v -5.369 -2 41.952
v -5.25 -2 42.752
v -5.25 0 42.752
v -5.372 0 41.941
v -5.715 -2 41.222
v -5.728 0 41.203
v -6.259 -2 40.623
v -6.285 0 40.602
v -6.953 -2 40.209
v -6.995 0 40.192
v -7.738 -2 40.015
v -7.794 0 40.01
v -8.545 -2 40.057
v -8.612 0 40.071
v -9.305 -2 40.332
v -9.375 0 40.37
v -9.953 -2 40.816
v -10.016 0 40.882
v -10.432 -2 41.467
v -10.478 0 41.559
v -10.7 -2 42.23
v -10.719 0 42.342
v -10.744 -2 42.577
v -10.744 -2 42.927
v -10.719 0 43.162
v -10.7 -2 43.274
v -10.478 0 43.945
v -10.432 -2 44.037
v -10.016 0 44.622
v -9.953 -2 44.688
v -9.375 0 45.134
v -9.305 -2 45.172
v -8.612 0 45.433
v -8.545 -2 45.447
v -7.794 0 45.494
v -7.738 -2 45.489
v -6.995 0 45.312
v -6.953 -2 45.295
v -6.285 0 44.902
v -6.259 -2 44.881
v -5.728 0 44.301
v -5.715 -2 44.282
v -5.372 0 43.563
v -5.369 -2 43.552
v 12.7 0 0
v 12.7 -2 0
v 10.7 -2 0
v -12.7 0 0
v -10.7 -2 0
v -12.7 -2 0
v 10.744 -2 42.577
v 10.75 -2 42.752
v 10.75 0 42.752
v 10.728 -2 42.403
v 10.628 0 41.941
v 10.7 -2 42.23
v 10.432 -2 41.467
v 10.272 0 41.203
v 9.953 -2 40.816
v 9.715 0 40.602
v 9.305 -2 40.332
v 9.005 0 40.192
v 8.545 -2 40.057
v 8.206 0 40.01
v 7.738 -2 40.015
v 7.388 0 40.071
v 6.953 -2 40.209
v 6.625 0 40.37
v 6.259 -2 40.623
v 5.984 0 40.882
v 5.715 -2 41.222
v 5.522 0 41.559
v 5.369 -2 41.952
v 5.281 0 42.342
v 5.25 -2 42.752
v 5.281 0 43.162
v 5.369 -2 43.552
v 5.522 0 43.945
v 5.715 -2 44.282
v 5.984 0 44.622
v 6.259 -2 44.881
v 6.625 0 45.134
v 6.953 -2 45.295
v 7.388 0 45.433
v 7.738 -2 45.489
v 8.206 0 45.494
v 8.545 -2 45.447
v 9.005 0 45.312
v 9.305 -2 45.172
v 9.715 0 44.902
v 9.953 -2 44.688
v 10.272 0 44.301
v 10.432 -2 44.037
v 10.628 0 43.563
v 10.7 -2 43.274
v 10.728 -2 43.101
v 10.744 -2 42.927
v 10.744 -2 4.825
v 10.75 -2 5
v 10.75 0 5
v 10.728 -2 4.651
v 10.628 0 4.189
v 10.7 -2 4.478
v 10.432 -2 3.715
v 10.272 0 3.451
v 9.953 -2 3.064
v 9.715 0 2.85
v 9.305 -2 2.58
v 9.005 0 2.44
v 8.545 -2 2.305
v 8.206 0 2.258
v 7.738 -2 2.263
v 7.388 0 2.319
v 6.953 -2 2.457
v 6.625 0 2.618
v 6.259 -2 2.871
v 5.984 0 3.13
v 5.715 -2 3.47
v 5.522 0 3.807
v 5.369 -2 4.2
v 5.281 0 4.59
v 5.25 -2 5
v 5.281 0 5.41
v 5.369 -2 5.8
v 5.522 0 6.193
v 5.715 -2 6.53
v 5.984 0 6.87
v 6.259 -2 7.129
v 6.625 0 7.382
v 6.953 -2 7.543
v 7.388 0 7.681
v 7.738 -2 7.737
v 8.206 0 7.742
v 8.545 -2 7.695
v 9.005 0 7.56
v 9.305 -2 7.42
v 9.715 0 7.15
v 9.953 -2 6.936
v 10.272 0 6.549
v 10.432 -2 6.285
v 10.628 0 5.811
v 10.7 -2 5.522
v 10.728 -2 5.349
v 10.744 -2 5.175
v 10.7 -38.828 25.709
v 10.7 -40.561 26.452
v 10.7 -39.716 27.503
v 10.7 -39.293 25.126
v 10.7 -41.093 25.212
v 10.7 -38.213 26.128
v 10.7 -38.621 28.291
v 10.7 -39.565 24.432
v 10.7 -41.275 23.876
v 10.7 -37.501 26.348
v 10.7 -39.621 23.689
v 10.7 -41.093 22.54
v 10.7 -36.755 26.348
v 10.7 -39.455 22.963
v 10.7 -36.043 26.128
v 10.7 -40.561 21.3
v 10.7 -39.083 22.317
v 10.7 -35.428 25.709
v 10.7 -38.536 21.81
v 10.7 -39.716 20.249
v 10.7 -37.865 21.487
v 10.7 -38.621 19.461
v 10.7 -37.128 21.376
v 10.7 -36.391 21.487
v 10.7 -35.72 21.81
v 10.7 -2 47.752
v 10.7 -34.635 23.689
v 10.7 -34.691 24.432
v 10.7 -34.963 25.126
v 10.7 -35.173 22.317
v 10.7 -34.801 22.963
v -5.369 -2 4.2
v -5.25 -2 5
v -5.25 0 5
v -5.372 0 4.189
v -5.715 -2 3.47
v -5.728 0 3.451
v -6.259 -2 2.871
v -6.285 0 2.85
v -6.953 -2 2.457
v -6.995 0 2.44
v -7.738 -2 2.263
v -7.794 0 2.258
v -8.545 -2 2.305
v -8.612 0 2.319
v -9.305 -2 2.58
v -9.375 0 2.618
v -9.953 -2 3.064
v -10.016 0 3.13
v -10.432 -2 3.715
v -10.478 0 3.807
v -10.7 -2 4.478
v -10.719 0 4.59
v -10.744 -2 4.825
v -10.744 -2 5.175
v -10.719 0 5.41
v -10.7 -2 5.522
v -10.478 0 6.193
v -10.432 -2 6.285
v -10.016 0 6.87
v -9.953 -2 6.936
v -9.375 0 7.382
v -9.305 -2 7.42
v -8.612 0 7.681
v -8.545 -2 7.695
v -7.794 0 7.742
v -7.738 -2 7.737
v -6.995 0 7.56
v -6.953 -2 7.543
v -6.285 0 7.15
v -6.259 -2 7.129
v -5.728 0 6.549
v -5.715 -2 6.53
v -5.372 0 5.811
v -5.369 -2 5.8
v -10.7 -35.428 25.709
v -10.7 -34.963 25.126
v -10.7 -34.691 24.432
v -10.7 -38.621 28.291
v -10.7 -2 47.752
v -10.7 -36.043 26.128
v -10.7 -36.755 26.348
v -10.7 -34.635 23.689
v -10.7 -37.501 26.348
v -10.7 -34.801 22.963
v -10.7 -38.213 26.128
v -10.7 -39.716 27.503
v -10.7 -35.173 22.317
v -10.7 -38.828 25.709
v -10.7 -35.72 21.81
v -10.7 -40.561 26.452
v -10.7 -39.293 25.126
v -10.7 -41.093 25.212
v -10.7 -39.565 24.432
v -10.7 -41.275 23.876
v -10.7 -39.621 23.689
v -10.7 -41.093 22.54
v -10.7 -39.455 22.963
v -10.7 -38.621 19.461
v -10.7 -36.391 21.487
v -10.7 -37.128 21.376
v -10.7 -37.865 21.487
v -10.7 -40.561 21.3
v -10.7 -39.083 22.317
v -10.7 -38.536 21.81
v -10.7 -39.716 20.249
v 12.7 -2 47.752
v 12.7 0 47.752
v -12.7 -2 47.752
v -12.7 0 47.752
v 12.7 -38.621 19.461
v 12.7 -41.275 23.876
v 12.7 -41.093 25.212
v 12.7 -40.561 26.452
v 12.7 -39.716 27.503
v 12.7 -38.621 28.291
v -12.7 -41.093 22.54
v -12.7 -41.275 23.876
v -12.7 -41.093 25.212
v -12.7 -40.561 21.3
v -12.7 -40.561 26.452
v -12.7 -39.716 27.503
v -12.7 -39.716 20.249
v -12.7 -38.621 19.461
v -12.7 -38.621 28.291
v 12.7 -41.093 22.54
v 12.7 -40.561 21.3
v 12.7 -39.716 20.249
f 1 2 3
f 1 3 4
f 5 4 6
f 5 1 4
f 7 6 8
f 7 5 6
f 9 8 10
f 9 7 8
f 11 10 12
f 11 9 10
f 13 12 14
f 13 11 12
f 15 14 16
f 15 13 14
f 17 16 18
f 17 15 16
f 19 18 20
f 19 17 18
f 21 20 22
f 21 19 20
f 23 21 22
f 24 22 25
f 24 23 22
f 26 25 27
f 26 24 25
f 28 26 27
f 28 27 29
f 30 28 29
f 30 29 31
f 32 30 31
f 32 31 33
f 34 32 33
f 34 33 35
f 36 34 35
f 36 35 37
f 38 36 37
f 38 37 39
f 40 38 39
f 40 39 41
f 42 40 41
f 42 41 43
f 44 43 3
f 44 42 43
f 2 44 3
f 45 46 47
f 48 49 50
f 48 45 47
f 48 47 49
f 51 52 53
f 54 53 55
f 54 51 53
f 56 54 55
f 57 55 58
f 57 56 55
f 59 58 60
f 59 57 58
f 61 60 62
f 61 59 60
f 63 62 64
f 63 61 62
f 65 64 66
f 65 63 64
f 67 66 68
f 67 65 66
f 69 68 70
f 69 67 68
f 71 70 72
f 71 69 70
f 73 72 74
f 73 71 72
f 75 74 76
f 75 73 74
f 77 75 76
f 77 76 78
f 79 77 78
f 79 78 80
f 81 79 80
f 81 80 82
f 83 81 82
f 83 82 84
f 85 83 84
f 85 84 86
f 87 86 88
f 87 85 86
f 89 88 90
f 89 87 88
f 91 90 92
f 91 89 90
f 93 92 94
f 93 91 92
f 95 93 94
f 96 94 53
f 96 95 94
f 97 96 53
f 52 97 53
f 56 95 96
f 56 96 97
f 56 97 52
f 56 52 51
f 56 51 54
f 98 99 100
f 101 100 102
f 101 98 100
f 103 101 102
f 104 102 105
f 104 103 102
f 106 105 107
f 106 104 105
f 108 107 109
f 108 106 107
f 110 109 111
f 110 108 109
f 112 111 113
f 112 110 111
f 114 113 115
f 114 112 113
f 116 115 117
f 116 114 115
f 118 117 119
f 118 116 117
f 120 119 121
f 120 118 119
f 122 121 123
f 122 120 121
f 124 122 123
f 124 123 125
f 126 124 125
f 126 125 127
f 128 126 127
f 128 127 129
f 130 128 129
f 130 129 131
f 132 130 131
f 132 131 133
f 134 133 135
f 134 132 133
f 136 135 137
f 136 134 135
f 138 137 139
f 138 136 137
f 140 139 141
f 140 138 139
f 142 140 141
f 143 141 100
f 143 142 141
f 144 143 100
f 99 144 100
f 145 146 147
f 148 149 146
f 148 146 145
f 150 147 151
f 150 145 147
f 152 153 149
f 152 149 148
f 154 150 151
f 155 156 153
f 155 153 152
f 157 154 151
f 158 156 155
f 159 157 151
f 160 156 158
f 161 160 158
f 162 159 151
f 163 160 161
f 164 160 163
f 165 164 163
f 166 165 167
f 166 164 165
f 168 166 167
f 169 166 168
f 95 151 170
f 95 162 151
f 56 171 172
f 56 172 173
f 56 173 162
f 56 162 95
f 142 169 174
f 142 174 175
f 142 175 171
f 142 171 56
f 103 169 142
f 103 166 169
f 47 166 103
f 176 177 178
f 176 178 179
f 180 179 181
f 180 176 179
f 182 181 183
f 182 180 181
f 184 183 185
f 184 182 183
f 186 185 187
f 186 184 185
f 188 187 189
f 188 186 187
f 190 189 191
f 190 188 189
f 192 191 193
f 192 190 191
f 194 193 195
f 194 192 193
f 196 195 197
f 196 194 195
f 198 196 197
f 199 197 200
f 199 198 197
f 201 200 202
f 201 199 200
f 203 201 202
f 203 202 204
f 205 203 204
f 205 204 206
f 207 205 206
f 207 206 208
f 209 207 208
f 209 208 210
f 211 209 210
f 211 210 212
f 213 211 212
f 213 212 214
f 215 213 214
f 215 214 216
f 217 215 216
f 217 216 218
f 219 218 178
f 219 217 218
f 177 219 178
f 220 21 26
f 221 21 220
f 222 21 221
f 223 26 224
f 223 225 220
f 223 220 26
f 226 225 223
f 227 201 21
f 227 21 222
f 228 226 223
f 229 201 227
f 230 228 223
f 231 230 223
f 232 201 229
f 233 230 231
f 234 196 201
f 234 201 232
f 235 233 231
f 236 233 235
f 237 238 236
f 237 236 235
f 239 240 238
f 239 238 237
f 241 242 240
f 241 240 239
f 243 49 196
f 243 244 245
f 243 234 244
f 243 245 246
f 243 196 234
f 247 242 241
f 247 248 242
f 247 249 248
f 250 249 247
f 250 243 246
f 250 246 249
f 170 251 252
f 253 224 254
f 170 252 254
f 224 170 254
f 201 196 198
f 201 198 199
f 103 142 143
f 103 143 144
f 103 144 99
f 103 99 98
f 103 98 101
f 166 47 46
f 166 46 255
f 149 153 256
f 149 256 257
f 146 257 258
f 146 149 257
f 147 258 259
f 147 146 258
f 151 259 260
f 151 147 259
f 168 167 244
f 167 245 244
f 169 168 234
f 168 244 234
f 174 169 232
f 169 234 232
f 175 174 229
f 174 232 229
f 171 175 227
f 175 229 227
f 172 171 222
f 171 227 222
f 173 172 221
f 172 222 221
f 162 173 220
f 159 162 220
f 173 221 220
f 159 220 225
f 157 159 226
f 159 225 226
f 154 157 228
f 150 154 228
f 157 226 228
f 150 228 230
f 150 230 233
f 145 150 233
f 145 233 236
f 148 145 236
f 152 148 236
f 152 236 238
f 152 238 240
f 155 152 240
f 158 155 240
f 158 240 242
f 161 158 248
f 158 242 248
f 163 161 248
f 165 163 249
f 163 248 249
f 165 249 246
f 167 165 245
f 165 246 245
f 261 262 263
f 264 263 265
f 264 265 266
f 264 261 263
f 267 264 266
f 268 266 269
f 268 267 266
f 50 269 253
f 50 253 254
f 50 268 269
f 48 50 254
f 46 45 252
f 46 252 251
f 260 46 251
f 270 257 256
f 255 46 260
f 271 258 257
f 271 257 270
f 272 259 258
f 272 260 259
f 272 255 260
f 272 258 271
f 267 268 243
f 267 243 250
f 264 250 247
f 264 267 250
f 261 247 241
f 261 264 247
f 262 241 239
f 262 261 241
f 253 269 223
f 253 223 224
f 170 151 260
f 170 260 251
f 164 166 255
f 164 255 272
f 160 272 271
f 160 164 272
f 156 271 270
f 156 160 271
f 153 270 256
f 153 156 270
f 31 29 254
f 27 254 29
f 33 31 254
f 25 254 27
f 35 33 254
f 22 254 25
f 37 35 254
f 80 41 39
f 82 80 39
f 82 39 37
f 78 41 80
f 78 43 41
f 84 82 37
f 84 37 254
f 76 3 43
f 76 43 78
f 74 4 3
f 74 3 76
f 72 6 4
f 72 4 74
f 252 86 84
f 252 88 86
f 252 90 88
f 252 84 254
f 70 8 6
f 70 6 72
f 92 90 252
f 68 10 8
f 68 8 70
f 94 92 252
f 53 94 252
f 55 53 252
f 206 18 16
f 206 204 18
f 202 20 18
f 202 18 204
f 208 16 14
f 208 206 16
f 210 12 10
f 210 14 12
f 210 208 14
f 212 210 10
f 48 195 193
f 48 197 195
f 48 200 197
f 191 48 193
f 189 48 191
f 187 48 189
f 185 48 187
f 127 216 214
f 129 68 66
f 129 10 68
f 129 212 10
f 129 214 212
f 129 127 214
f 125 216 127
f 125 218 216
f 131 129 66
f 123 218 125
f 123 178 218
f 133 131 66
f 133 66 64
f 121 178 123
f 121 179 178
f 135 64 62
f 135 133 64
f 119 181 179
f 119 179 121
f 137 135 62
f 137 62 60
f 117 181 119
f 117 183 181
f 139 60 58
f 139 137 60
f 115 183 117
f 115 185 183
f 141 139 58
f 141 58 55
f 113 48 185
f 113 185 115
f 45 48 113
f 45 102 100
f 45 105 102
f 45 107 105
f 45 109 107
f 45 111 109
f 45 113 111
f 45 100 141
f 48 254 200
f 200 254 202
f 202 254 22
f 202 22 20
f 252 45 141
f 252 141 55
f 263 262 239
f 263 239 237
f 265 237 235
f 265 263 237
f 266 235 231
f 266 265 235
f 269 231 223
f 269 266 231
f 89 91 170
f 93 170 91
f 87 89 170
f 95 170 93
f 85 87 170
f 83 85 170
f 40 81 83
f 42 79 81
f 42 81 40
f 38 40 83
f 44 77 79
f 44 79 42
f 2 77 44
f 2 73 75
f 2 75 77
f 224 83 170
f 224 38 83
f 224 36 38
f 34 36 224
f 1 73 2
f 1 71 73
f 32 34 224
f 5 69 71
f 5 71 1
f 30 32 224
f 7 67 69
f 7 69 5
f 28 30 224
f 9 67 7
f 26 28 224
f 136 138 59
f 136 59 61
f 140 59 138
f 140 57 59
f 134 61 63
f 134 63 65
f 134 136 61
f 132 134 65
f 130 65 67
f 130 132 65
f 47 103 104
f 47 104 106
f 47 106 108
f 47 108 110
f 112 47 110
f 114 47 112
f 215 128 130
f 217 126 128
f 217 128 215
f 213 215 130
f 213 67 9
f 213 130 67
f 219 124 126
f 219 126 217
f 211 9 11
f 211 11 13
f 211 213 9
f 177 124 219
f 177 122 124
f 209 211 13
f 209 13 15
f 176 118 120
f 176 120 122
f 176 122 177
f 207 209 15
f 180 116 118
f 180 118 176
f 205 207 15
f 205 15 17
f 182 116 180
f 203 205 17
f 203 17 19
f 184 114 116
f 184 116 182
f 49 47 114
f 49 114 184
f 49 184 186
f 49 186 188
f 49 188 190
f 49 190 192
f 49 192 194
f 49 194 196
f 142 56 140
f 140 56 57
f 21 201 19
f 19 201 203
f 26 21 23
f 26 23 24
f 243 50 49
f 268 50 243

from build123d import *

# Parameters (mm, degrees)
BOSS_EXTRUDE1_DEPTH          = 47.752
CUT_EXTRUDE1_DEPTH           = 47.752
CUT_EXTRUDE1_DEPTH_BACK      = 47.752
BOSS_EXTRUDE6_START          = -10.7
SKETCH3_R                    = 2.5
BOSS_EXTRUDE6_DEPTH          = 10.7
SKETCH3_2_R                  = 2.5
BOSS_EXTRUDE7_DEPTH          = 10.7
M5_START                     = -2
M5_CLEARANCE_HOLE1_OUTLINE_R = 2.75
M5_CLEARANCE_HOLE1_DEPTH     = 2


# Read off the part's stored shape, not the designer's step: M5 Clearance Hole1
with BuildPart() as part:
    # Sketch1 → Boss-Extrude1 (new body)
    with BuildSketch(Plane.XY):
        Polygon((-12.7, -41.275), (-12.7, 0), (12.7, 0), (12.7, -41.275), (10.7, -41.275), (10.7, -2), (-10.7, -2), (-10.7, -41.275), align=None)
    extrude(amount=BOSS_EXTRUDE1_DEPTH)

    # Sketch2 → Cut-Extrude1 (cut, two sides: drawn at the far end of the back side and taken through both)
    with BuildSketch(Plane(origin=(0, 0, 0), x_dir=(0, 0, -1), z_dir=(1, 0, 0)).offset(-CUT_EXTRUDE1_DEPTH_BACK)):
        with BuildLine():
            Line((-23.876, -42.10871549), (-23.876, -41.275))
            ThreePointArc((-23.876, -41.275), (-26.451700932, -40.560529688), (-28.291297125, -38.621305883))
            Line((-28.291297125, -38.621305883), (-47.752, -2))
            Line((-47.752, -2), (-47.752, -42.10871549))
            Line((-47.752, -42.10871549), (-23.876, -42.10871549))
        make_face()
        with BuildLine():
            Line((0, -42.10871549), (0, -2))
            Line((0, -2), (-19.460702875, -38.621305883))
            ThreePointArc((-19.460702875, -38.621305883), (-21.300299068, -40.560529688), (-23.876, -41.275))
            Line((-23.876, -41.275), (-23.876, -42.10871549))
            Line((-23.876, -42.10871549), (0, -42.10871549))
        make_face()
    extrude(amount=CUT_EXTRUDE1_DEPTH + CUT_EXTRUDE1_DEPTH_BACK, mode=Mode.SUBTRACT)

    # Sketch3 → Boss-Extrude6 (add)
    with BuildSketch(Plane(origin=(0, 0, 0), x_dir=(0, 0, -1), z_dir=(1, 0, 0)).offset(BOSS_EXTRUDE6_START)):
        with Locations((-23.876, -37.128004449)):
            Circle(SKETCH3_R)
    extrude(amount=BOSS_EXTRUDE6_DEPTH)

    # Sketch3<2> → Boss-Extrude7 (add)
    with BuildSketch(Plane(origin=(0, 0, 0), x_dir=(0, 0, -1), z_dir=(1, 0, 0))):
        with Locations((-23.876, -37.128004449)):
            Circle(SKETCH3_2_R)
    extrude(amount=BOSS_EXTRUDE7_DEPTH)

    # M5 Clearance Hole1 outline → M5 Clearance Hole1 (cut)
    with BuildSketch(Plane(origin=(0, 0, 0), x_dir=(1, 0, 0), z_dir=(0, 1, 0)).offset(M5_START)):
        with Locations((8, -5)):
            Circle(M5_CLEARANCE_HOLE1_OUTLINE_R)
        with Locations((8, -42.752)):
            Circle(M5_CLEARANCE_HOLE1_OUTLINE_R)
        with Locations((-8, -42.752)):
            Circle(M5_CLEARANCE_HOLE1_OUTLINE_R)
        with Locations((-8, -5)):
            Circle(M5_CLEARANCE_HOLE1_OUTLINE_R)
    extrude(amount=M5_CLEARANCE_HOLE1_DEPTH, mode=Mode.SUBTRACT)


solid = part.part
